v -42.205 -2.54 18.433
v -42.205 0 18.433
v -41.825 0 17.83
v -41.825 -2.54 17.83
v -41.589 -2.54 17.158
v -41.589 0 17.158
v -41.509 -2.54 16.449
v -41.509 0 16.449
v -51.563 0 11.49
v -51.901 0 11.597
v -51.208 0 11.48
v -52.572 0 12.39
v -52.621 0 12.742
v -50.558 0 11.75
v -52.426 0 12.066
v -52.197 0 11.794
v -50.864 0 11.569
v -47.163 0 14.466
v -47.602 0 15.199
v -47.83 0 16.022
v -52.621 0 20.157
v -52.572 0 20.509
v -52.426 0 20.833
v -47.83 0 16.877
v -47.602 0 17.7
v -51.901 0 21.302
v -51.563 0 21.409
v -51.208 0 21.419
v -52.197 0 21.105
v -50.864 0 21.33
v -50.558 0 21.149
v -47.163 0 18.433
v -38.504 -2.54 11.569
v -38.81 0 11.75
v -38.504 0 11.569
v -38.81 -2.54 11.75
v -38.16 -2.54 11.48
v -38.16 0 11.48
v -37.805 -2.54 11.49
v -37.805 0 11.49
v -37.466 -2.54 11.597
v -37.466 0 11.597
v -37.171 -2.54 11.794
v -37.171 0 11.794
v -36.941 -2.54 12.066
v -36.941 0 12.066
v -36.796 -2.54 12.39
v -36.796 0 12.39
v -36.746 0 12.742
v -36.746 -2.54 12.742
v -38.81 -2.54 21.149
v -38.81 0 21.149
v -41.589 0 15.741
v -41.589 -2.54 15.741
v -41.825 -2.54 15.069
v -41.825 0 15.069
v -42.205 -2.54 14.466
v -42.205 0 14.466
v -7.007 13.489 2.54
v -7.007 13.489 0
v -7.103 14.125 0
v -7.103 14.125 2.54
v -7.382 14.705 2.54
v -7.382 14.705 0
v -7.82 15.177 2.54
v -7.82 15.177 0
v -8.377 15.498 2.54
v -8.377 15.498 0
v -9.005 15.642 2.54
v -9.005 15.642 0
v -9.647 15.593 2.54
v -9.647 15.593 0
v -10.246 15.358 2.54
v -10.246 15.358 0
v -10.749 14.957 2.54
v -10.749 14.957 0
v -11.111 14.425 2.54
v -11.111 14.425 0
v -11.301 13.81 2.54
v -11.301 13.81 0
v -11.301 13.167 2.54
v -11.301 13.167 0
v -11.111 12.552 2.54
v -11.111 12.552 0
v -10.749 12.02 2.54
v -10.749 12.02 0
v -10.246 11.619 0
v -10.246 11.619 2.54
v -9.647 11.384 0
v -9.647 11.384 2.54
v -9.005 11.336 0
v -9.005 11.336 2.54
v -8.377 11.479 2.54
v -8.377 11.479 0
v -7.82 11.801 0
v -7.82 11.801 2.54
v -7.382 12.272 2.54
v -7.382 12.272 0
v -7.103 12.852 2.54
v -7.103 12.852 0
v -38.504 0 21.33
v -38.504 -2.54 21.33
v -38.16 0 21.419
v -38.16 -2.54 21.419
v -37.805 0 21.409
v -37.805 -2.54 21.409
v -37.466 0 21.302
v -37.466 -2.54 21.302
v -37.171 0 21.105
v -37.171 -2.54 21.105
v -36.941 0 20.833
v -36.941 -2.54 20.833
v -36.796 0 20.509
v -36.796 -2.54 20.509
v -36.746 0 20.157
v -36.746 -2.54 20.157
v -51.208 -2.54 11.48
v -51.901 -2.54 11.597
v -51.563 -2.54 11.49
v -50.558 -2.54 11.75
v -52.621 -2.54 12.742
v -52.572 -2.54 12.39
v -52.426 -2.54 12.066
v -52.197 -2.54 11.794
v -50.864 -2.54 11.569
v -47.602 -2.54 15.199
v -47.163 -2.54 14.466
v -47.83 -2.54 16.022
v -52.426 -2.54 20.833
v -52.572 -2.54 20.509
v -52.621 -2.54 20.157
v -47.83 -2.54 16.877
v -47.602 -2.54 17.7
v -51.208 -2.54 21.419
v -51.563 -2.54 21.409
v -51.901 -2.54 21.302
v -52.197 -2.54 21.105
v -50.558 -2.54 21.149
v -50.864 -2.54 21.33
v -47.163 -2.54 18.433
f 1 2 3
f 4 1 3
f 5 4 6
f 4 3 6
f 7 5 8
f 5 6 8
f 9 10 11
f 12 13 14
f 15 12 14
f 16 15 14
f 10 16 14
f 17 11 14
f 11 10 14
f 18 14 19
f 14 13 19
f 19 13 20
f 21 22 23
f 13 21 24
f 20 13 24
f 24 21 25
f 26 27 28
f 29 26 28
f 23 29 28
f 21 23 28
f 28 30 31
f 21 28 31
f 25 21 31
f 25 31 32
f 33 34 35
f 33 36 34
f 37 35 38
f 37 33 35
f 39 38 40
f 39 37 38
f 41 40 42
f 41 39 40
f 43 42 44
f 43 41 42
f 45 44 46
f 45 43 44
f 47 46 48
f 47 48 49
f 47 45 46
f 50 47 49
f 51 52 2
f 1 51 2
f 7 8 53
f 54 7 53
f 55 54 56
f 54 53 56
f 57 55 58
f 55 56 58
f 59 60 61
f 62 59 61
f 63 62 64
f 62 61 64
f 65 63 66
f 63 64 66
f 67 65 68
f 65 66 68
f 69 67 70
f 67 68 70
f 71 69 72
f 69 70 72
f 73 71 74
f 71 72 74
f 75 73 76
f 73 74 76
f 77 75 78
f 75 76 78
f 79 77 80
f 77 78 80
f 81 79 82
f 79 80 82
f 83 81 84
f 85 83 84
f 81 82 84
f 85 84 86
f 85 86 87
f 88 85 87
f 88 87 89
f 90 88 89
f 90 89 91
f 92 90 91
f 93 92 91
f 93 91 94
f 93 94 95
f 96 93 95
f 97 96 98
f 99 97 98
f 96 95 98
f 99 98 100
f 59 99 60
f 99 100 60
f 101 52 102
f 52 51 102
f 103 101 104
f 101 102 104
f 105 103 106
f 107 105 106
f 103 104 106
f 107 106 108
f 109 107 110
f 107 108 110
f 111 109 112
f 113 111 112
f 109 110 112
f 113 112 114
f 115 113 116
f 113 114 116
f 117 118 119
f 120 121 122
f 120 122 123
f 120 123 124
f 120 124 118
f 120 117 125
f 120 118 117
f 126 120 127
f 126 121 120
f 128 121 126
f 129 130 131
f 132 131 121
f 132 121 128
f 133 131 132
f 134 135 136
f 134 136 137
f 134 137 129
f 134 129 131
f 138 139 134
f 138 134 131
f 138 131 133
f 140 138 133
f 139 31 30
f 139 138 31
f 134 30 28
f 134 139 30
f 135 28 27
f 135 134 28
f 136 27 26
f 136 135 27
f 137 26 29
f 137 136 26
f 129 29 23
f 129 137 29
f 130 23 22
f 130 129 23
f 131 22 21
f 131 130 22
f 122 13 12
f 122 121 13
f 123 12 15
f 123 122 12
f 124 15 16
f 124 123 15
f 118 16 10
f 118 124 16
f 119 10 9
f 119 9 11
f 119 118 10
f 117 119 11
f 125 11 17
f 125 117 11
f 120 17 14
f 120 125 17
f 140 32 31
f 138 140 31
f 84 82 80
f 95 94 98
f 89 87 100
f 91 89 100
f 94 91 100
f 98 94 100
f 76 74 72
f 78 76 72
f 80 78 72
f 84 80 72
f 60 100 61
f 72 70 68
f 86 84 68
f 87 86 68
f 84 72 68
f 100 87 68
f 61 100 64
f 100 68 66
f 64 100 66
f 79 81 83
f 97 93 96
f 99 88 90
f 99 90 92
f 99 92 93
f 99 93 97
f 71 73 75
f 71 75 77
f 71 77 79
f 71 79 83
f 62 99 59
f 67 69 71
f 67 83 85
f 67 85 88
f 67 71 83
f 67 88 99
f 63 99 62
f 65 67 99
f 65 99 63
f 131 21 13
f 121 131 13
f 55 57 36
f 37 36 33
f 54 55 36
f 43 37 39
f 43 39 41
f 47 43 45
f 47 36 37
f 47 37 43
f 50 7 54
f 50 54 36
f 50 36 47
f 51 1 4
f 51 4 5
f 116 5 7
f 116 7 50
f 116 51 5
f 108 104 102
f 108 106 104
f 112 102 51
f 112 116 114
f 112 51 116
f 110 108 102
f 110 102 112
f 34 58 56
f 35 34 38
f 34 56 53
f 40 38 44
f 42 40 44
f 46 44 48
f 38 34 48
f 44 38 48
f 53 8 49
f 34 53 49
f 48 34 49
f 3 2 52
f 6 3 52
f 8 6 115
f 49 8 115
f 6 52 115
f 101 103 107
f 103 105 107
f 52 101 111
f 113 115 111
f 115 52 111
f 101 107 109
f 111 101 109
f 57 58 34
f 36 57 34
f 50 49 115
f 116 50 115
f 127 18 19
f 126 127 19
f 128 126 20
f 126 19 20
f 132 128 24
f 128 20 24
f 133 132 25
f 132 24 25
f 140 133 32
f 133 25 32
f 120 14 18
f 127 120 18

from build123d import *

# Parameters (mm, degrees)
F1_DEPTH = 2.54
F2_R     = 1.27
F3_R     = 2.159
F4_DEPTH = 2.54


with BuildPart() as f1:
    # F0 (on Front) → F1 (new body)
    with BuildSketch(Plane.XZ):
        with BuildLine():
            Line((-36.746302, 22.79944), (-42.204544, 18.432847))
            ThreePointArc((-42.204544, 18.432847), (-41.687782, 17.500387), (-41.508802, 16.44944))
            ThreePointArc((-41.508802, 16.44944), (-41.687782, 15.398493), (-42.204544, 14.466033))
            Line((-42.204544, 14.466033), (-36.746302, 10.09944))
            Line((-36.746302, 10.09944), (-36.746302, 22.79944))
        make_face()
        with BuildLine():
            Line((-47.163061, 18.432847), (-52.621302, 22.79944))
            Line((-52.621302, 22.79944), (-52.621302, 10.09944))
            Line((-52.621302, 10.09944), (-47.163061, 14.466033))
            ThreePointArc((-47.163061, 14.466033), (-47.858802, 16.44944), (-47.163061, 18.432847))
        make_face()
    extrude(amount=F1_DEPTH)

    # F2
    f2_edges = [f1.edges().sort_by_distance(p)[0] for p in [
        (-52.621302, -1.27, 10.09944),
        (-36.746302, -1.27, 10.09944),
        (-36.746302, -1.27, 22.79944),
        (-52.621302, -1.27, 22.79944),
    ]]
    fillet(f2_edges, radius=F2_R)


with BuildPart() as f4:
    # F3 (on Top) → F4 (new body)
    with BuildSketch(Plane.XY):
        with Locations((-9.166194, 13.488539)):
            Circle(F3_R)
    extrude(amount=F4_DEPTH)


solid = Compound([f1.part, f4.part])
